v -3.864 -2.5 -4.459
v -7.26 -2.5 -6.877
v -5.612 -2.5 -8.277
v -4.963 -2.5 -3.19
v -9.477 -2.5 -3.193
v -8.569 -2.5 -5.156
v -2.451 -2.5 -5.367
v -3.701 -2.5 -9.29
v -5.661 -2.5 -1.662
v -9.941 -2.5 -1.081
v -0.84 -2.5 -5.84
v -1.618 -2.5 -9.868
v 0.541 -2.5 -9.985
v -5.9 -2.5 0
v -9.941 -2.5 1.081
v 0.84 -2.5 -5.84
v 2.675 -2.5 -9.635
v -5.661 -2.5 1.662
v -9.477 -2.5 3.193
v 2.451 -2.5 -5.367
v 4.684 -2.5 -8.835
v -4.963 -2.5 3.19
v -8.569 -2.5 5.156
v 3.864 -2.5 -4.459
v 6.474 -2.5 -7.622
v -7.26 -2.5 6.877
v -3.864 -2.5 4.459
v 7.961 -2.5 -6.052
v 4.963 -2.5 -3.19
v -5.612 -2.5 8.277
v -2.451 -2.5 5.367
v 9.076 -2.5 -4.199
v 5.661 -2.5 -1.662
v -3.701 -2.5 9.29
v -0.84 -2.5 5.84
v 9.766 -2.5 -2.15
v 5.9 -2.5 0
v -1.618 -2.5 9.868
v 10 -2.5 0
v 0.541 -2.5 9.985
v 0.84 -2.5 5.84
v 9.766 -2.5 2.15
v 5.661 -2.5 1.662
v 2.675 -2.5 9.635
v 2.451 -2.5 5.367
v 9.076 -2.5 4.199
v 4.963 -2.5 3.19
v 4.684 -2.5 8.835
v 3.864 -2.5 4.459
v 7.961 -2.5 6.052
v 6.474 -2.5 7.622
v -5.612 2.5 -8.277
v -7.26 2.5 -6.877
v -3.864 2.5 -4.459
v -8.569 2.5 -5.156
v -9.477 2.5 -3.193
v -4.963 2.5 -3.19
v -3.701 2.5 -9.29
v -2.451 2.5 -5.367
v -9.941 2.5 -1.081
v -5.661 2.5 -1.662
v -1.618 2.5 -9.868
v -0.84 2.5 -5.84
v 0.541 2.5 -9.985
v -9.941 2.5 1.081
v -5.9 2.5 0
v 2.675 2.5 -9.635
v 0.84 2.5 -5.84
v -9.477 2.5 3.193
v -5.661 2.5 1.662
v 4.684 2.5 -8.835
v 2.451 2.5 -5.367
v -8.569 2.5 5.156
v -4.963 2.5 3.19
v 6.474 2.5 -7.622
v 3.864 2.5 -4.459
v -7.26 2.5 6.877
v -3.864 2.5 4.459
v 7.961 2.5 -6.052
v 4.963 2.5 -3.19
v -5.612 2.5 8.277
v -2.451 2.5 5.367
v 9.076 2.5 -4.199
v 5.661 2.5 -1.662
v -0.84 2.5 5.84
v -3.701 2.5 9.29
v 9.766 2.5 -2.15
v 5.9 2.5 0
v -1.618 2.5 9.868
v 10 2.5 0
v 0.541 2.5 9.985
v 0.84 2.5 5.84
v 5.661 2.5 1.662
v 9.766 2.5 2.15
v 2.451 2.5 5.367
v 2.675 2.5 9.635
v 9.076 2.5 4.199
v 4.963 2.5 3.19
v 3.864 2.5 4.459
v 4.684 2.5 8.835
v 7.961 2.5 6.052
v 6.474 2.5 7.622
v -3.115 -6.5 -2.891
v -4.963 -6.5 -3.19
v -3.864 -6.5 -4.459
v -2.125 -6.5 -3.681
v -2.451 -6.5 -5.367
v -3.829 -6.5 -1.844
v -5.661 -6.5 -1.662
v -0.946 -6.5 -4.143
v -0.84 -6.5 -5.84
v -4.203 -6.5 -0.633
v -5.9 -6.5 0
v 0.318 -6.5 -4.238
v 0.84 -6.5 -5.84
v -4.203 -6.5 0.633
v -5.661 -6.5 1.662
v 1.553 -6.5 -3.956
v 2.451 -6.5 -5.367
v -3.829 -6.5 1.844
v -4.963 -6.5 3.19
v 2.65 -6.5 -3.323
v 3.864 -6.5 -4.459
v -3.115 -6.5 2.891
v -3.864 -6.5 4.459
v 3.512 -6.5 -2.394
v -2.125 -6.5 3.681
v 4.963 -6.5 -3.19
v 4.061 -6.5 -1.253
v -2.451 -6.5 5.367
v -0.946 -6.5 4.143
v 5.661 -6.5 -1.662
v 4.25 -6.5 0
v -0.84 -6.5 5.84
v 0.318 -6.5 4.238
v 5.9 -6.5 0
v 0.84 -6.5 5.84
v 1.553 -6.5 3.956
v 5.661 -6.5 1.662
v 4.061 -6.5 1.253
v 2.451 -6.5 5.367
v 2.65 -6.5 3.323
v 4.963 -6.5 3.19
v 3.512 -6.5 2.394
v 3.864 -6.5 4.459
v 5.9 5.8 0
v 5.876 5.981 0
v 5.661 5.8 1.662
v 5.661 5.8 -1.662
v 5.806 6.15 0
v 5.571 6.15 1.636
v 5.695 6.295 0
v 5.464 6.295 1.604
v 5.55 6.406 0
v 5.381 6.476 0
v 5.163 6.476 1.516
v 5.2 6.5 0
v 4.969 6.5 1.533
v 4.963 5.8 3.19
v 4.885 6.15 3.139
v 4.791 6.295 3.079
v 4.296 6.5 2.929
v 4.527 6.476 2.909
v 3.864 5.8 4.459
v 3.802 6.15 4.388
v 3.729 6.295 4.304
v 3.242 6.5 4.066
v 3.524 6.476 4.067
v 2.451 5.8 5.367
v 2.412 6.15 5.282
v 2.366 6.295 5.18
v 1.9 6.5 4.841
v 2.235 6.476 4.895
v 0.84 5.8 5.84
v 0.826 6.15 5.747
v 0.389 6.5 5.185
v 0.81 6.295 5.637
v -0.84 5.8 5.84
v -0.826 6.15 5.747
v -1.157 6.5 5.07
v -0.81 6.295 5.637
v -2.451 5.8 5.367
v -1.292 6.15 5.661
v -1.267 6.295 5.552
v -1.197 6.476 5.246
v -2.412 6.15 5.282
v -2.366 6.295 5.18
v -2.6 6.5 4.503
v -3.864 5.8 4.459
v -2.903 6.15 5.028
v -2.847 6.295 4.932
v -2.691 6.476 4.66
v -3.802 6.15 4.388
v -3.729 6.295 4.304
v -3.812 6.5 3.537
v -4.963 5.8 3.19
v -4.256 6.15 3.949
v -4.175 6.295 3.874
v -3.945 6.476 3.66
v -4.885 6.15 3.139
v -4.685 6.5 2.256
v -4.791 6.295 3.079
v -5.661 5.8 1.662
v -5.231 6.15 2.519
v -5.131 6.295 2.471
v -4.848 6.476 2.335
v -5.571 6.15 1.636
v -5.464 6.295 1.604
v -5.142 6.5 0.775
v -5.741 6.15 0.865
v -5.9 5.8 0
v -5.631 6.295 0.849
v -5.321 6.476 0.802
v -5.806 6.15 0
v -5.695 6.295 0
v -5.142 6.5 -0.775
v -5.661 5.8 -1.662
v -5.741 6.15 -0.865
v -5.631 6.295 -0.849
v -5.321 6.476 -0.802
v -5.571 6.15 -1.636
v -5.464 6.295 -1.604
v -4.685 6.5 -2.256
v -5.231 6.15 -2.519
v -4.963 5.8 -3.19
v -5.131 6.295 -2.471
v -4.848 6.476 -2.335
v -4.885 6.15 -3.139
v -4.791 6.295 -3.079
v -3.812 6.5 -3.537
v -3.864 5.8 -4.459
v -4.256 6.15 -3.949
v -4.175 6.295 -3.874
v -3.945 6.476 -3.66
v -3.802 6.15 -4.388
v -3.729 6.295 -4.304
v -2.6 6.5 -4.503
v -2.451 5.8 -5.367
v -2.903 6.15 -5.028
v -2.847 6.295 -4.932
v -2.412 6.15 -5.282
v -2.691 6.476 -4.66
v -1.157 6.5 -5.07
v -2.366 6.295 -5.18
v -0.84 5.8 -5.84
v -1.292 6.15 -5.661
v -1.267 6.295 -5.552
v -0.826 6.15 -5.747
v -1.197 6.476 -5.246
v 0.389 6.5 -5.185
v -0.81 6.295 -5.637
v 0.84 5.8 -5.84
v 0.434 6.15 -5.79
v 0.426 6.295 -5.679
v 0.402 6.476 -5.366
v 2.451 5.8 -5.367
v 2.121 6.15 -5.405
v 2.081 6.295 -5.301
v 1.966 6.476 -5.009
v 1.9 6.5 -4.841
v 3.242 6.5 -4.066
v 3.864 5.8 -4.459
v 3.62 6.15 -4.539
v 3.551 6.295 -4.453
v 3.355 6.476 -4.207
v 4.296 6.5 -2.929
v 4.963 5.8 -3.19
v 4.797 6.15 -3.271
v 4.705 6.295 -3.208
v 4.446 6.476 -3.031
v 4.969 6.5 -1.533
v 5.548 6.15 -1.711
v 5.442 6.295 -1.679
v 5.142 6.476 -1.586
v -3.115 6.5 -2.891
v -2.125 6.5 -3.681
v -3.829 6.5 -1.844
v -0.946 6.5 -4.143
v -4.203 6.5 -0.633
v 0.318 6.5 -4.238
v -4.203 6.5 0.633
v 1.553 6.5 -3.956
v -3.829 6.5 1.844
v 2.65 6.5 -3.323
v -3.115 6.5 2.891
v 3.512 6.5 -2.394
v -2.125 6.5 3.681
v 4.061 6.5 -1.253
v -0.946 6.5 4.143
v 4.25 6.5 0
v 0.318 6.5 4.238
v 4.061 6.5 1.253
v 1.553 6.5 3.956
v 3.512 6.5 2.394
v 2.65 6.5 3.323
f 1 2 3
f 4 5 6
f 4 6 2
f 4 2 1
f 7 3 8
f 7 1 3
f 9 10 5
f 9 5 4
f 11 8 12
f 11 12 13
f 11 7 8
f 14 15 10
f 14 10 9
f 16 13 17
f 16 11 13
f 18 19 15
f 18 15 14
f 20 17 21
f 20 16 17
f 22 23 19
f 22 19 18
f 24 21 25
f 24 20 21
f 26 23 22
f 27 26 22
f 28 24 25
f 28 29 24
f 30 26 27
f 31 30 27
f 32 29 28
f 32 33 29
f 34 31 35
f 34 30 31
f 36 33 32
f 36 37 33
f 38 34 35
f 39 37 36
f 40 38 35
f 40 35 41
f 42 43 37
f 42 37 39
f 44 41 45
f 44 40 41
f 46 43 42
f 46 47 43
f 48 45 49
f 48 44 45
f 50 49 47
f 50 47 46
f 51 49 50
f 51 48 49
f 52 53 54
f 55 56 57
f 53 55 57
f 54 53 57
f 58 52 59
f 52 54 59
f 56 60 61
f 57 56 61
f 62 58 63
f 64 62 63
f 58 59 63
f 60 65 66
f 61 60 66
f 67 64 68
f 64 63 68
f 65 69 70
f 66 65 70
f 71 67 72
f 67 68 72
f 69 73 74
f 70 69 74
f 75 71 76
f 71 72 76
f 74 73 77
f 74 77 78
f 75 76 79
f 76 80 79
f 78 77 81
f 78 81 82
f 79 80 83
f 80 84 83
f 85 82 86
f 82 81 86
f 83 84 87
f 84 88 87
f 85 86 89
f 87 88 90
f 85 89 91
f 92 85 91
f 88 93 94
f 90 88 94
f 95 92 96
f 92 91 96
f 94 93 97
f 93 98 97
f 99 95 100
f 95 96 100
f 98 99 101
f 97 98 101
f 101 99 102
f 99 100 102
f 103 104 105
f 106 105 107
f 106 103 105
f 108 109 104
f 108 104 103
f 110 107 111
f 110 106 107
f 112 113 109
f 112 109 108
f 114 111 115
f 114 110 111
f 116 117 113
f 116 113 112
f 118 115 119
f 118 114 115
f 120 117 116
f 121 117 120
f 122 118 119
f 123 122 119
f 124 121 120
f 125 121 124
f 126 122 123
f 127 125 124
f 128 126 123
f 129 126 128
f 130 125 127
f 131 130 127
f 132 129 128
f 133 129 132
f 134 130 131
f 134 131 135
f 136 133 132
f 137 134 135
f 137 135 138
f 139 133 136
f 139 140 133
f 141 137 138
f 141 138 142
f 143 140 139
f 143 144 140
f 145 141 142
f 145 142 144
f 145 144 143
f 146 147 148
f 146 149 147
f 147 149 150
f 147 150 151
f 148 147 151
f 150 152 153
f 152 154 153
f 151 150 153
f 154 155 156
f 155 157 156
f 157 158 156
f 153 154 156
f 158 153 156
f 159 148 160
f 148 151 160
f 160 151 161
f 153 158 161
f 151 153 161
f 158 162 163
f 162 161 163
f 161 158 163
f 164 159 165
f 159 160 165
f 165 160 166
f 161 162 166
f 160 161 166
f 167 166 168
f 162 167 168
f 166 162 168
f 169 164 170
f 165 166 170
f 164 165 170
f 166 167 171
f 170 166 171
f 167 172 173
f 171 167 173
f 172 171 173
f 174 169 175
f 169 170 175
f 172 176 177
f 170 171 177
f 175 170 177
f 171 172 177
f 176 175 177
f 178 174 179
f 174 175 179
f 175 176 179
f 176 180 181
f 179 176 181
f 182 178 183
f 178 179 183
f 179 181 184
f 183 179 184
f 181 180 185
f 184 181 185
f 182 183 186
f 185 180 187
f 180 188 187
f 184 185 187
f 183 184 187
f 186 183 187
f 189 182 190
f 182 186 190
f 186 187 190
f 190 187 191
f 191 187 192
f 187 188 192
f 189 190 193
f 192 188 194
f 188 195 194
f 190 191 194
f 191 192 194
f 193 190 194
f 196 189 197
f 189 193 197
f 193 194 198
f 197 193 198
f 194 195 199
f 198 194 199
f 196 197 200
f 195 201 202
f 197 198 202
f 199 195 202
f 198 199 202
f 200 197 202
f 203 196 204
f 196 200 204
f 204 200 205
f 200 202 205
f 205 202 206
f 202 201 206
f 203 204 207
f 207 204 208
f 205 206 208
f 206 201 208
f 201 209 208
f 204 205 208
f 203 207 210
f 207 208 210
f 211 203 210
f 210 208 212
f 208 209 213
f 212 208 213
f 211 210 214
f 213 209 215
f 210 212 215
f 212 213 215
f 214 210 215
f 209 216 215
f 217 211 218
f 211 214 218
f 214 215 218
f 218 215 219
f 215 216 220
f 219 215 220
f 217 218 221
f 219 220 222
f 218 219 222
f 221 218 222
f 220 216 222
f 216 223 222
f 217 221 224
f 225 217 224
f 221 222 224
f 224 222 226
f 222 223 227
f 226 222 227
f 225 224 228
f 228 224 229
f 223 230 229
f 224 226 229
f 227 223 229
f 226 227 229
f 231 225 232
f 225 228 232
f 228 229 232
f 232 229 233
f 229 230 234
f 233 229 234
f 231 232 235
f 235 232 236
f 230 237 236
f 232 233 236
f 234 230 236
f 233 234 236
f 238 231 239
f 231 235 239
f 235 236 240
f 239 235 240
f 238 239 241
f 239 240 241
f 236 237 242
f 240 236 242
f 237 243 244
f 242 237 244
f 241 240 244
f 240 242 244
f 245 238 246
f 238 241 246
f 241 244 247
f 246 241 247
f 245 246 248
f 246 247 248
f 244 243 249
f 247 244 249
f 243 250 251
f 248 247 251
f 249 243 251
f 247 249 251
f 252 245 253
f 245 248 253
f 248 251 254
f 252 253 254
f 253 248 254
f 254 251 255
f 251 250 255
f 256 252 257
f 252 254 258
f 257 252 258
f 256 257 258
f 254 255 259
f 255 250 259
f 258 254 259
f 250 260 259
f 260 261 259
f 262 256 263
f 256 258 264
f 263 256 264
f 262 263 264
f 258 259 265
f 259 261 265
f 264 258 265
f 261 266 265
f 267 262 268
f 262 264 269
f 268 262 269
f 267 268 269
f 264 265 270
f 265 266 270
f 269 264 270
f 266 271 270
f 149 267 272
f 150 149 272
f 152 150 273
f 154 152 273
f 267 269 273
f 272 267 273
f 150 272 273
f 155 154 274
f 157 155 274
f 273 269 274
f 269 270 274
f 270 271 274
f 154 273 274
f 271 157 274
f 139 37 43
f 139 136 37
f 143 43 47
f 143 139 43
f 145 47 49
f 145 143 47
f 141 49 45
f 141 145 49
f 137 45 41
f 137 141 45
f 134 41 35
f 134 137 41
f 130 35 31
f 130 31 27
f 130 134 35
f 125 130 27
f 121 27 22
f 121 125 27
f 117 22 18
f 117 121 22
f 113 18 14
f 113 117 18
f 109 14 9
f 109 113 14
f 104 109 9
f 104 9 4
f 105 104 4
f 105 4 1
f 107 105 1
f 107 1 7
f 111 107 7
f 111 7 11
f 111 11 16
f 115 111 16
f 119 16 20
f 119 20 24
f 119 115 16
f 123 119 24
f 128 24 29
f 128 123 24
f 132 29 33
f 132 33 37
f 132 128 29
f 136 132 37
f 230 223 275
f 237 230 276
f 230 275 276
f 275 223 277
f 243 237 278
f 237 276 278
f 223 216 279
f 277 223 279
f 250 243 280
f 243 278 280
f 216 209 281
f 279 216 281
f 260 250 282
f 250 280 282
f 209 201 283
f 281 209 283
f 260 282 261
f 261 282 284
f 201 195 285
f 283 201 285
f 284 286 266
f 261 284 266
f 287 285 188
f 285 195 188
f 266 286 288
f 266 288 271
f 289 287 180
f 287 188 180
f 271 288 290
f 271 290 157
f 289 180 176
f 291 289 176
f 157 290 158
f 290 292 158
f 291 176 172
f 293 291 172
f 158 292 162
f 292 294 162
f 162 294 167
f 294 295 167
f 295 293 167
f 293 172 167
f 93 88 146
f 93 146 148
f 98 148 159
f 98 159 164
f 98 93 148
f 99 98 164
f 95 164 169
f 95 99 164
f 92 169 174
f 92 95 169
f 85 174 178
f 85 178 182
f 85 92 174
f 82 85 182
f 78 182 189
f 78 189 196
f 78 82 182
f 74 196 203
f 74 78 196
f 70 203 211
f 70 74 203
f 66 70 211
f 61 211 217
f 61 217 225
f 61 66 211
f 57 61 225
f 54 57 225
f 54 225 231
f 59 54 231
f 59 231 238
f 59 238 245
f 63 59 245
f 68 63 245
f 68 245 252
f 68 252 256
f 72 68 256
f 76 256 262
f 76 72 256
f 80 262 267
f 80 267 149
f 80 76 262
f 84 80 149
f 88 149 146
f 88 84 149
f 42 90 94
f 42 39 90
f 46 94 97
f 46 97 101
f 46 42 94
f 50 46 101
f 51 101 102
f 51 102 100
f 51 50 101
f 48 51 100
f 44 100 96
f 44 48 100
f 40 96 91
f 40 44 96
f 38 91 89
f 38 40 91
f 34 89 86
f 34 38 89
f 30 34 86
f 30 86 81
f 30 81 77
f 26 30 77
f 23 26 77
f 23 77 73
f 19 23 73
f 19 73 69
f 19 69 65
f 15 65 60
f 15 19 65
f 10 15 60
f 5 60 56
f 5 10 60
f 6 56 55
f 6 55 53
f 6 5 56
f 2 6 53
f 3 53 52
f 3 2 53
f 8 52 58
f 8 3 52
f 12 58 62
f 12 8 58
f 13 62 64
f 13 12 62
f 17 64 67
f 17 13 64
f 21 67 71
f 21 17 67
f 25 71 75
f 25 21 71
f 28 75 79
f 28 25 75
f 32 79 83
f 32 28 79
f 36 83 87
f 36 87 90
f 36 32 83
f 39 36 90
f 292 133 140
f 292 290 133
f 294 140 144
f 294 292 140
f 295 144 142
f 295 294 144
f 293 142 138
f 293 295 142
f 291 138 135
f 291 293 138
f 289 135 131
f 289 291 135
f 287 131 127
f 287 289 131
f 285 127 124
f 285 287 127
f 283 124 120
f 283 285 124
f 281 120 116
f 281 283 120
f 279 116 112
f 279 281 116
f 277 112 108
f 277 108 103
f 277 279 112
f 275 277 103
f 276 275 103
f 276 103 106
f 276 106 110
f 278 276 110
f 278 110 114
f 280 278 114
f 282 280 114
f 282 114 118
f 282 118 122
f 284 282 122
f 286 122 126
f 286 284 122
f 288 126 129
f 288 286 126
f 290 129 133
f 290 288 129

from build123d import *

# Parameters (mm, degrees)
F0_R     = 10
F0_R_2   = 5.9
F1_DEPTH = 2.5
F0_R_3   = 4.25
F2_DEPTH = 6.5
F3_R     = 0.7


with BuildPart() as f1:
    # F0 (on Front) → F1 (new body, symmetric)
    with BuildSketch(Plane.XZ):
        Circle(F0_R)
        Circle(F0_R_2, mode=Mode.SUBTRACT)
    extrude(amount=F1_DEPTH, both=True)

    # F0 (on Front) → F2 (join, symmetric)
    with BuildSketch(Plane.XZ):
        Circle(F0_R_2)
        Circle(F0_R_3, mode=Mode.SUBTRACT)
    extrude(amount=F2_DEPTH, both=True)

    # F3
    f3_edges = [f1.edges().sort_by_distance(p)[0] for p in [
        (-5.9, 6.5, 0),
    ]]
    fillet(f3_edges, radius=F3_R)


solid = f1.part
